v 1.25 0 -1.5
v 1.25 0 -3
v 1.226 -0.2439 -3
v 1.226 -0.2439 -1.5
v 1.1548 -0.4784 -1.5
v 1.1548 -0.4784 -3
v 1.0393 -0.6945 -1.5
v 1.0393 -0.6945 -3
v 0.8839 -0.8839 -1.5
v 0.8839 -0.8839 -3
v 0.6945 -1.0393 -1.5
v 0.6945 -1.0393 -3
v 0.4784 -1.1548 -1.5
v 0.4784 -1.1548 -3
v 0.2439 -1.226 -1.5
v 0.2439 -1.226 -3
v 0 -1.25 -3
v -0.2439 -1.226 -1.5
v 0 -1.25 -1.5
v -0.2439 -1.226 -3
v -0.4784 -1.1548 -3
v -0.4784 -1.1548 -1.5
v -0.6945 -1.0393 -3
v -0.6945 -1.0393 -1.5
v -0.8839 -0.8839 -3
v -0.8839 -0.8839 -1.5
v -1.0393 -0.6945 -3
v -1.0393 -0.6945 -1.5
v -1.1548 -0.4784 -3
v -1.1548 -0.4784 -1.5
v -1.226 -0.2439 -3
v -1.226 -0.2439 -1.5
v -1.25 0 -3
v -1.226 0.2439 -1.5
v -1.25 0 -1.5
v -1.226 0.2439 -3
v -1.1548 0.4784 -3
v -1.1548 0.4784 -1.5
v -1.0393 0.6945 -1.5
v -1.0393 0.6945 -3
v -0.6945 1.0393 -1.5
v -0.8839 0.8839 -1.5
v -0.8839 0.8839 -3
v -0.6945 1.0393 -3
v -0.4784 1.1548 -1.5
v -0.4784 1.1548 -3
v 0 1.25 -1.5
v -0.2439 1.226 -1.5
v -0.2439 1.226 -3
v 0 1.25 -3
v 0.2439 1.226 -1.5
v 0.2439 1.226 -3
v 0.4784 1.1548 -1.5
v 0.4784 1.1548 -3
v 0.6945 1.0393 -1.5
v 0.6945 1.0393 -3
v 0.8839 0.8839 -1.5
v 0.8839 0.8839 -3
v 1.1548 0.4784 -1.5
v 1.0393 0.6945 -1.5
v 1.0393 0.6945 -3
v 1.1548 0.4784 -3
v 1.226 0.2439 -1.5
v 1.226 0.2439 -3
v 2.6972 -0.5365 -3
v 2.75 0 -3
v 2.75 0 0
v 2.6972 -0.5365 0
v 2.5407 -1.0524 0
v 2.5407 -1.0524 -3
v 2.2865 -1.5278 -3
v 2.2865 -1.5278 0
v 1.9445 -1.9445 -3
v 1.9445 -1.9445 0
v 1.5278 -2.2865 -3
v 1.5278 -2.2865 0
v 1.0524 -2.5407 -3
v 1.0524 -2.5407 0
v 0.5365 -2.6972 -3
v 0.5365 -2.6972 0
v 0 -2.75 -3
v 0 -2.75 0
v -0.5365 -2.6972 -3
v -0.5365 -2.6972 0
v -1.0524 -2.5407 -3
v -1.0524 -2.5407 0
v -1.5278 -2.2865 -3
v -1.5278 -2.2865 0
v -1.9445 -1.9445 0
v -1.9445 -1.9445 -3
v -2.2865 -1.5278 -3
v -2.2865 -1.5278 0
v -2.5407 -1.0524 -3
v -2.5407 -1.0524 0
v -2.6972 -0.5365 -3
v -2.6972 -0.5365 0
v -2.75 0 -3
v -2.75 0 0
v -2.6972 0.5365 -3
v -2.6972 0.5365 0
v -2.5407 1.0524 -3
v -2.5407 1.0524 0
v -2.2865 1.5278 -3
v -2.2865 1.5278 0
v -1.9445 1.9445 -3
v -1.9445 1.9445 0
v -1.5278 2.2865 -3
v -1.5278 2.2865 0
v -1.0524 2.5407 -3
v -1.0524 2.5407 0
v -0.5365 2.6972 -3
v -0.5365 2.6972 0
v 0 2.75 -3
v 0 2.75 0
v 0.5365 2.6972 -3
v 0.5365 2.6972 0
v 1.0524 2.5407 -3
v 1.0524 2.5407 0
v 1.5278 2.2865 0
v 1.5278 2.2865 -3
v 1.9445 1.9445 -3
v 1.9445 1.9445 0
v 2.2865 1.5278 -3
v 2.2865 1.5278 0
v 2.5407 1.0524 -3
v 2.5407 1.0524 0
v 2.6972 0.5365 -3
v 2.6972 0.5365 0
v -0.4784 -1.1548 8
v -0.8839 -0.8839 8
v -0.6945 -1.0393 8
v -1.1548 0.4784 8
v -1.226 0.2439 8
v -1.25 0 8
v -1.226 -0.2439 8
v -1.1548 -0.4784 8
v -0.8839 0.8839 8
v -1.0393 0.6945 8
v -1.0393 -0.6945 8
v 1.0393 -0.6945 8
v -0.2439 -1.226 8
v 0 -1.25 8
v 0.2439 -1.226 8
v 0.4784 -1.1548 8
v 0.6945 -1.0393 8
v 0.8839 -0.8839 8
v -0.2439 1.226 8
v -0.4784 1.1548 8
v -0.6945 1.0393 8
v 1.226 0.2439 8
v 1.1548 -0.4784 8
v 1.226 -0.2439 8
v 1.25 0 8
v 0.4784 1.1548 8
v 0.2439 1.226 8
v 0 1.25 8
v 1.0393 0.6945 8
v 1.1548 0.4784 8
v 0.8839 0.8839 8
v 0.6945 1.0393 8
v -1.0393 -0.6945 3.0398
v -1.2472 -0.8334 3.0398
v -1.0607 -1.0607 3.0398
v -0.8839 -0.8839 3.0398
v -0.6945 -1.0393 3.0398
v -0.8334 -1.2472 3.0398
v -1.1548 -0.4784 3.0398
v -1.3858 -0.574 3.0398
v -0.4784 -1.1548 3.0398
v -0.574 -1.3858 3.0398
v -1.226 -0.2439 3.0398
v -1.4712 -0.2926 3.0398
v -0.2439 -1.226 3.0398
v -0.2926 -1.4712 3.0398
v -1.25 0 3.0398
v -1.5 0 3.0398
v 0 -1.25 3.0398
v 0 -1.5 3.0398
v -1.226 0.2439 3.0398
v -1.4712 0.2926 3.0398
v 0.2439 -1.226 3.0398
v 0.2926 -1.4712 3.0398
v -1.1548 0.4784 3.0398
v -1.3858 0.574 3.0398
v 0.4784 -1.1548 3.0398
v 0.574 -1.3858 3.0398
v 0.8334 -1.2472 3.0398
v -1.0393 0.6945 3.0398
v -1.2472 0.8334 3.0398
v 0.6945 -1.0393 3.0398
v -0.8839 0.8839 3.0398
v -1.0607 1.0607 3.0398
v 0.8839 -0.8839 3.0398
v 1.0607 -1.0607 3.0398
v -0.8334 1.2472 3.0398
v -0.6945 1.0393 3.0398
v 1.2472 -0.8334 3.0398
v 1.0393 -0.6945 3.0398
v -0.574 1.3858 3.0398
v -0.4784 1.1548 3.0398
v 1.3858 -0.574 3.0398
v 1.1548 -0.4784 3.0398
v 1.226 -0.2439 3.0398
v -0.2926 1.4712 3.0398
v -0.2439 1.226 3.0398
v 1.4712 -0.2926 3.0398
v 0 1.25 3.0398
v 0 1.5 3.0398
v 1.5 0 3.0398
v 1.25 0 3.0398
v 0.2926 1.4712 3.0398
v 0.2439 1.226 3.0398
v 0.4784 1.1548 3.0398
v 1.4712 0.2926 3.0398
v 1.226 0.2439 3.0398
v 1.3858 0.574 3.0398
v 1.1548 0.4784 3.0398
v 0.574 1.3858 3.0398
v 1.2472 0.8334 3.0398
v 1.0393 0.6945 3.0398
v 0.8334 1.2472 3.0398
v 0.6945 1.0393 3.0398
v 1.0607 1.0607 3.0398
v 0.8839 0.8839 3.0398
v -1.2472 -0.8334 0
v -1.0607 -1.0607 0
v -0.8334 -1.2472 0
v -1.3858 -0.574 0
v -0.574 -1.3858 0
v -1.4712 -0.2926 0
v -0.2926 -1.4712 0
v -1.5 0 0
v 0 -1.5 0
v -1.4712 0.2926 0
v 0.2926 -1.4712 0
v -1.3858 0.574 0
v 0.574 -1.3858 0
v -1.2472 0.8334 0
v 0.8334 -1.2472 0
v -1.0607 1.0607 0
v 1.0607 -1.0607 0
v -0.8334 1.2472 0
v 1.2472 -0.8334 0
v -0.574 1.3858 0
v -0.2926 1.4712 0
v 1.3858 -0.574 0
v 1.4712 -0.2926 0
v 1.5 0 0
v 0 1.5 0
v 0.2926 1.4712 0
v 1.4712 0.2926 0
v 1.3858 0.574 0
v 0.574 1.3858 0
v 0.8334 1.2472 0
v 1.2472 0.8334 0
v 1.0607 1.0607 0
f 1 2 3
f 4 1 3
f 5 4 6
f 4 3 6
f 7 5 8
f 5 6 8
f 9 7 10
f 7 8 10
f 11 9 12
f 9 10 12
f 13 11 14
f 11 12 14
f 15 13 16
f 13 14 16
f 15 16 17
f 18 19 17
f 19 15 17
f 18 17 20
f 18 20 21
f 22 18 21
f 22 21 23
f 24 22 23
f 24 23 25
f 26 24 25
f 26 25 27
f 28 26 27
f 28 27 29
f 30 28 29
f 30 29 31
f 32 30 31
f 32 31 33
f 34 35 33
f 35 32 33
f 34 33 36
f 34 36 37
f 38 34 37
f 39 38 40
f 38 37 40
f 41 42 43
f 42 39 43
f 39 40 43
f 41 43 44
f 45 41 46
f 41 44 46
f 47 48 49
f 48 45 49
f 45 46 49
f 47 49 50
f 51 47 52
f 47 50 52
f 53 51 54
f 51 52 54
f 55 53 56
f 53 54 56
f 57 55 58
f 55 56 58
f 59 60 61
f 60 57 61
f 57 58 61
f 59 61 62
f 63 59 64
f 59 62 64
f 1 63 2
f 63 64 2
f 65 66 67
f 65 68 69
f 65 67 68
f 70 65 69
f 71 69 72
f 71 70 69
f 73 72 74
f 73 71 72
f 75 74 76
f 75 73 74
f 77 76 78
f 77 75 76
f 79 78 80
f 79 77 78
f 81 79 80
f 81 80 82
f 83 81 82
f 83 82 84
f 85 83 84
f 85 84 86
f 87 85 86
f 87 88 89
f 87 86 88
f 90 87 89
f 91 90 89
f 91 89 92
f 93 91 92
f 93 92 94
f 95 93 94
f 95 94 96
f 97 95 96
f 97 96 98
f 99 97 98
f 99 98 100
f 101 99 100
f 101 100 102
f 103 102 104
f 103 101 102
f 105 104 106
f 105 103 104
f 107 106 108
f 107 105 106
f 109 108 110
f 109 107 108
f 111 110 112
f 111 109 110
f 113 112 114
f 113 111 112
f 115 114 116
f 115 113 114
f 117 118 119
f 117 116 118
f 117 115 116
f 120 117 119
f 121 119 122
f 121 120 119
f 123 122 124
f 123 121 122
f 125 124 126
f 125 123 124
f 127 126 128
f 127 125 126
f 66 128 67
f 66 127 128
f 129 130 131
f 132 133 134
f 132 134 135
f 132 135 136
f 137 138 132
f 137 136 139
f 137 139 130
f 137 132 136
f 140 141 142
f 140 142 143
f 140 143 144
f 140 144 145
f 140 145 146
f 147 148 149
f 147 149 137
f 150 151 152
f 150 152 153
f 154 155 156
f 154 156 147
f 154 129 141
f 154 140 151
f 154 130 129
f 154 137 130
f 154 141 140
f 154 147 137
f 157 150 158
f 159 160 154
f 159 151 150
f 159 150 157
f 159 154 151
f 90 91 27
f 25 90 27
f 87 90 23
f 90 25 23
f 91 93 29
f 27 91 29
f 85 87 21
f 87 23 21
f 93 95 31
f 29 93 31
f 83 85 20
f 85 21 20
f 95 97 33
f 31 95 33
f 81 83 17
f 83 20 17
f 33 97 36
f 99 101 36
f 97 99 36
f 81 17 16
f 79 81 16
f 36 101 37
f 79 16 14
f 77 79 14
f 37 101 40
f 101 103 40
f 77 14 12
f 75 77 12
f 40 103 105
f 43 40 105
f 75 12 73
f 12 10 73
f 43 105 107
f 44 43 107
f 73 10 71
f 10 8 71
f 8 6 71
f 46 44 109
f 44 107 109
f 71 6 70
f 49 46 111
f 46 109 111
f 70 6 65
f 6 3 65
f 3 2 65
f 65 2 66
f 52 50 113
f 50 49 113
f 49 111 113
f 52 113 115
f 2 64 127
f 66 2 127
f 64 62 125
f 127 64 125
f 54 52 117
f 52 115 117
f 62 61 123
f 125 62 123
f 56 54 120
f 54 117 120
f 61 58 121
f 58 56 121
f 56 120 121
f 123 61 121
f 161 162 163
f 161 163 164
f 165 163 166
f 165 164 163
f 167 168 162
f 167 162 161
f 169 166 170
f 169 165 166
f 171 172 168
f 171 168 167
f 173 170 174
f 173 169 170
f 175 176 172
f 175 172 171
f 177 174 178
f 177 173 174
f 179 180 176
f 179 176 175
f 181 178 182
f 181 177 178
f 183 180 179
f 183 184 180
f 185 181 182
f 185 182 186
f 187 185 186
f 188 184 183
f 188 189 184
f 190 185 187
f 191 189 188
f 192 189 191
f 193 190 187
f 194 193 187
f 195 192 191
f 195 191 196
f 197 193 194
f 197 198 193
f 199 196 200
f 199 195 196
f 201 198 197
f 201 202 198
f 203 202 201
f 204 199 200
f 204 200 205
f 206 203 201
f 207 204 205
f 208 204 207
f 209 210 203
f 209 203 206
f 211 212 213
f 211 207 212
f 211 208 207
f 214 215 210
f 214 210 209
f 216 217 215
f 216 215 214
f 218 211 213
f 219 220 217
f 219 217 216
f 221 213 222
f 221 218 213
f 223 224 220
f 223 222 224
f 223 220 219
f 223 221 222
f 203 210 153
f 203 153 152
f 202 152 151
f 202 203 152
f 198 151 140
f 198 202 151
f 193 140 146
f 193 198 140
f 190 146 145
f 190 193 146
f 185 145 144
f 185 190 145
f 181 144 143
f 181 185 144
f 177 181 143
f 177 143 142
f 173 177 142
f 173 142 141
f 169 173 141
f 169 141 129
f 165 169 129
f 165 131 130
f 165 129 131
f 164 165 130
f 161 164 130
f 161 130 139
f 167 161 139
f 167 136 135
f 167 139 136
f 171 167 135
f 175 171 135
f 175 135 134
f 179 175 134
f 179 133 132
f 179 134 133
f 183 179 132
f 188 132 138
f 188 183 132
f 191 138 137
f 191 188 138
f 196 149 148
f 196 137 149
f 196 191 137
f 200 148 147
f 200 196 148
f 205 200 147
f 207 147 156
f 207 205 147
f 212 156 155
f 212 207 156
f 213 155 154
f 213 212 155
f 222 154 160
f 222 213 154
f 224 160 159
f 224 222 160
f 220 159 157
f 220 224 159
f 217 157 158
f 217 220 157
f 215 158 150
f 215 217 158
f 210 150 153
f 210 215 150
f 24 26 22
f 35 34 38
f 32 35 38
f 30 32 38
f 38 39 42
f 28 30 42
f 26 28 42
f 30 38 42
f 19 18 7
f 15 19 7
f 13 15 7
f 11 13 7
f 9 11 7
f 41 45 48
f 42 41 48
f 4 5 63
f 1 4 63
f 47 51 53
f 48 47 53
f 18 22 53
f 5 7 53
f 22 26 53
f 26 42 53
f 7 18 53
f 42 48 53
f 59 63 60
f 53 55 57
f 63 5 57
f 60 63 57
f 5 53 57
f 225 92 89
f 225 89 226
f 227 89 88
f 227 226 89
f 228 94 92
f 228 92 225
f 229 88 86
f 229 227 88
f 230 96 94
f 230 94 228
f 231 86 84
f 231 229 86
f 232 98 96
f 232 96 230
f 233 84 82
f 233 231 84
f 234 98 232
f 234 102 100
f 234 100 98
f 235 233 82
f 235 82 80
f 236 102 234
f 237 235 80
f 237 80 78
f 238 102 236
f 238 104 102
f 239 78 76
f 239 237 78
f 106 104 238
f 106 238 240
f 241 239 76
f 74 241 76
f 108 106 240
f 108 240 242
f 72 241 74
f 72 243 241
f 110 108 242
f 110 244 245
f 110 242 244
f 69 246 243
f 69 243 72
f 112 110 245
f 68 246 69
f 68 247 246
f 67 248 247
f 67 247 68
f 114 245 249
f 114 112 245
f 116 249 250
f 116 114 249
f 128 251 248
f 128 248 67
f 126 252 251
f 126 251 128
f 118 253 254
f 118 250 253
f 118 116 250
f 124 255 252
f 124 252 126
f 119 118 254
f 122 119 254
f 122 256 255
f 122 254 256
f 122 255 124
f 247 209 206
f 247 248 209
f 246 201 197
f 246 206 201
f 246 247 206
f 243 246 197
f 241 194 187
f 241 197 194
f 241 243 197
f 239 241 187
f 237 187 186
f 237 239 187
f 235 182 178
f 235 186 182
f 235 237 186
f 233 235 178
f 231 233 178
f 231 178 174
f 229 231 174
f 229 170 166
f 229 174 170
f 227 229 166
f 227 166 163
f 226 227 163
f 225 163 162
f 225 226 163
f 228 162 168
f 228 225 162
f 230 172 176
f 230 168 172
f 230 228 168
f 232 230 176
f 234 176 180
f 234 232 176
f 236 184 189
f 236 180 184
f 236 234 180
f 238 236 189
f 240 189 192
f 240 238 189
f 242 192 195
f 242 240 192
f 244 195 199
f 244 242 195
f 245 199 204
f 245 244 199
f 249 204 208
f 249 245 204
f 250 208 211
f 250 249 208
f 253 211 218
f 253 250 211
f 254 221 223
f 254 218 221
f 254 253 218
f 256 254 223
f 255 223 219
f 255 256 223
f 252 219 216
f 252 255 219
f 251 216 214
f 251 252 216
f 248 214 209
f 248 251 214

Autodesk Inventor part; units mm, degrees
ref_plane "Work Plane1" through (0, 0, -3) normal (0, 0, 1) x (1, 0, 0)
sketch "Sketch1" plane through (0, 0, -3) normal (0, 0, 1) x (1, 0, 0)
  circle A0 centre (0, 0) radius 2.75
extrude "M3_Head_Envelope" add sketch "Sketch1" along normal blind 3
sketch "Sketch2" plane through (0, 0, 0) normal (0, 0, 1) x (1, 0, 0)
  circle A0 centre (0, 0) radius 1.5
extrude "M3_Clearance_Grip" add sketch "Sketch2" along normal blind 3.0398
ref_plane "Work Plane2" through (0, 0, 3.0398) normal (0, 0, 1) x (1, 0, 0)
sketch "Sketch3" plane through (0, 0, 3.0398) normal (0, 0, 1) x (1, 0, 0)
  circle A0 centre (0, 0) radius 1.25
extrude "Thread_Core_No_Helix" add sketch "Sketch3" along normal blind 4.9602
ref_plane "Work Plane3" through (0, 0, -3) normal (0, 0, 1) x (1, 0, 0)
sketch "Sketch4" plane through (0, 0, -3) normal (0, 0, 1) x (1, 0, 0)
  circle A0 centre (0, 0) radius 1.25
extrude "Extrusion4" cut sketch "Sketch4" along normal blind 1.5
properties part number "Device_M3x8_Simplified"
